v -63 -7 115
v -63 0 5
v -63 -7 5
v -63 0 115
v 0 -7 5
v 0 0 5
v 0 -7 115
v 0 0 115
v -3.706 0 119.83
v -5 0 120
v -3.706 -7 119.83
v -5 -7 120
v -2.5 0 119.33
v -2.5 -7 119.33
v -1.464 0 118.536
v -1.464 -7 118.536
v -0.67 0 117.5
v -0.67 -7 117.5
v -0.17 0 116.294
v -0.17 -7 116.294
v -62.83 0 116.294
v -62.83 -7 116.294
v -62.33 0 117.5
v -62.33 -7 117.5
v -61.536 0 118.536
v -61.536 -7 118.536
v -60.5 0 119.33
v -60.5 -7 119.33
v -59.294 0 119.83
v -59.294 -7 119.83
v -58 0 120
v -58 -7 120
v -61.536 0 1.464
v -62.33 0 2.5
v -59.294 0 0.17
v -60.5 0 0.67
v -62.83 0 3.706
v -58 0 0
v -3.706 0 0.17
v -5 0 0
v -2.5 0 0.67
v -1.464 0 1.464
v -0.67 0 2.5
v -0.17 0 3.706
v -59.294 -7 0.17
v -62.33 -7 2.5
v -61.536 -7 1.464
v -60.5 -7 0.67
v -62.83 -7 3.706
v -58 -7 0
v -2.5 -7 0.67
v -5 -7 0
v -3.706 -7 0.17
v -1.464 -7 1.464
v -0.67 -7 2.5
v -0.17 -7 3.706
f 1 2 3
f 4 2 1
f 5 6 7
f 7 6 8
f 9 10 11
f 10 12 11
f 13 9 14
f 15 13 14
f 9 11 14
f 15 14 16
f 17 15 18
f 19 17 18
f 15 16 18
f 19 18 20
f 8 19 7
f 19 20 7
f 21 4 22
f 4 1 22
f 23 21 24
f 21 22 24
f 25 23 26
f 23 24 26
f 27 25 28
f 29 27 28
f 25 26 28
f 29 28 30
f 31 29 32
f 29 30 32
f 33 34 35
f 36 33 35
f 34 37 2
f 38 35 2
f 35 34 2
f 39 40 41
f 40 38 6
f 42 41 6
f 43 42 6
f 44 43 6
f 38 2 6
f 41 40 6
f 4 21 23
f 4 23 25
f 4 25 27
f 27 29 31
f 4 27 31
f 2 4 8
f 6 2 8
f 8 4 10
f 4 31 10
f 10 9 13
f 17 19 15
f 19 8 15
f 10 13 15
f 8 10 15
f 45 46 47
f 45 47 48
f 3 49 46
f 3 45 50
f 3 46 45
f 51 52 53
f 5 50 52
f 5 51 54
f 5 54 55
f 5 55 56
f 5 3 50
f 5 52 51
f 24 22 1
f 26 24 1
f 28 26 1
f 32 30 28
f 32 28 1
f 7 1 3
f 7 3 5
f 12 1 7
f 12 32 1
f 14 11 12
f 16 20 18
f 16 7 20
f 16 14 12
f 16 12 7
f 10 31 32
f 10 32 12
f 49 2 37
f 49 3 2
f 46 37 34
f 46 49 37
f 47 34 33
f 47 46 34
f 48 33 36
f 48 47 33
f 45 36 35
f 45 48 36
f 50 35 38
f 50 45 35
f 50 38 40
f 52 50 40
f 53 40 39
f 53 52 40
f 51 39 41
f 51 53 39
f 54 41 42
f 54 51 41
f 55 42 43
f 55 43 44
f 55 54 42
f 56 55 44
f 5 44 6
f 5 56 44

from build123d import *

# Parameters (mm, degrees)
F0_W     = 63
F0_H     = 120
F1_DEPTH = 7
F2_R     = 5
F3_R     = 5


with BuildPart() as f1:
    # F0 (on Front) → F1 (new body)
    with BuildSketch(Plane.XZ):
        with Locations((-31.5, 60)):
            Rectangle(F0_W, F0_H)
    extrude(amount=F1_DEPTH)

    # F2
    f2_edges = [f1.edges().sort_by_distance(p)[0] for p in [
        (-63, -3.5, 120),
    ]]
    fillet(f2_edges, radius=F2_R)

    # F3
    f3_edges = [f1.edges().sort_by_distance(p)[0] for p in [
        (0, -3.5, 120),
        (-63, -3.5, 0),
        (0, -3.5, 0),
    ]]
    fillet(f3_edges, radius=F3_R)


solid = f1.part
